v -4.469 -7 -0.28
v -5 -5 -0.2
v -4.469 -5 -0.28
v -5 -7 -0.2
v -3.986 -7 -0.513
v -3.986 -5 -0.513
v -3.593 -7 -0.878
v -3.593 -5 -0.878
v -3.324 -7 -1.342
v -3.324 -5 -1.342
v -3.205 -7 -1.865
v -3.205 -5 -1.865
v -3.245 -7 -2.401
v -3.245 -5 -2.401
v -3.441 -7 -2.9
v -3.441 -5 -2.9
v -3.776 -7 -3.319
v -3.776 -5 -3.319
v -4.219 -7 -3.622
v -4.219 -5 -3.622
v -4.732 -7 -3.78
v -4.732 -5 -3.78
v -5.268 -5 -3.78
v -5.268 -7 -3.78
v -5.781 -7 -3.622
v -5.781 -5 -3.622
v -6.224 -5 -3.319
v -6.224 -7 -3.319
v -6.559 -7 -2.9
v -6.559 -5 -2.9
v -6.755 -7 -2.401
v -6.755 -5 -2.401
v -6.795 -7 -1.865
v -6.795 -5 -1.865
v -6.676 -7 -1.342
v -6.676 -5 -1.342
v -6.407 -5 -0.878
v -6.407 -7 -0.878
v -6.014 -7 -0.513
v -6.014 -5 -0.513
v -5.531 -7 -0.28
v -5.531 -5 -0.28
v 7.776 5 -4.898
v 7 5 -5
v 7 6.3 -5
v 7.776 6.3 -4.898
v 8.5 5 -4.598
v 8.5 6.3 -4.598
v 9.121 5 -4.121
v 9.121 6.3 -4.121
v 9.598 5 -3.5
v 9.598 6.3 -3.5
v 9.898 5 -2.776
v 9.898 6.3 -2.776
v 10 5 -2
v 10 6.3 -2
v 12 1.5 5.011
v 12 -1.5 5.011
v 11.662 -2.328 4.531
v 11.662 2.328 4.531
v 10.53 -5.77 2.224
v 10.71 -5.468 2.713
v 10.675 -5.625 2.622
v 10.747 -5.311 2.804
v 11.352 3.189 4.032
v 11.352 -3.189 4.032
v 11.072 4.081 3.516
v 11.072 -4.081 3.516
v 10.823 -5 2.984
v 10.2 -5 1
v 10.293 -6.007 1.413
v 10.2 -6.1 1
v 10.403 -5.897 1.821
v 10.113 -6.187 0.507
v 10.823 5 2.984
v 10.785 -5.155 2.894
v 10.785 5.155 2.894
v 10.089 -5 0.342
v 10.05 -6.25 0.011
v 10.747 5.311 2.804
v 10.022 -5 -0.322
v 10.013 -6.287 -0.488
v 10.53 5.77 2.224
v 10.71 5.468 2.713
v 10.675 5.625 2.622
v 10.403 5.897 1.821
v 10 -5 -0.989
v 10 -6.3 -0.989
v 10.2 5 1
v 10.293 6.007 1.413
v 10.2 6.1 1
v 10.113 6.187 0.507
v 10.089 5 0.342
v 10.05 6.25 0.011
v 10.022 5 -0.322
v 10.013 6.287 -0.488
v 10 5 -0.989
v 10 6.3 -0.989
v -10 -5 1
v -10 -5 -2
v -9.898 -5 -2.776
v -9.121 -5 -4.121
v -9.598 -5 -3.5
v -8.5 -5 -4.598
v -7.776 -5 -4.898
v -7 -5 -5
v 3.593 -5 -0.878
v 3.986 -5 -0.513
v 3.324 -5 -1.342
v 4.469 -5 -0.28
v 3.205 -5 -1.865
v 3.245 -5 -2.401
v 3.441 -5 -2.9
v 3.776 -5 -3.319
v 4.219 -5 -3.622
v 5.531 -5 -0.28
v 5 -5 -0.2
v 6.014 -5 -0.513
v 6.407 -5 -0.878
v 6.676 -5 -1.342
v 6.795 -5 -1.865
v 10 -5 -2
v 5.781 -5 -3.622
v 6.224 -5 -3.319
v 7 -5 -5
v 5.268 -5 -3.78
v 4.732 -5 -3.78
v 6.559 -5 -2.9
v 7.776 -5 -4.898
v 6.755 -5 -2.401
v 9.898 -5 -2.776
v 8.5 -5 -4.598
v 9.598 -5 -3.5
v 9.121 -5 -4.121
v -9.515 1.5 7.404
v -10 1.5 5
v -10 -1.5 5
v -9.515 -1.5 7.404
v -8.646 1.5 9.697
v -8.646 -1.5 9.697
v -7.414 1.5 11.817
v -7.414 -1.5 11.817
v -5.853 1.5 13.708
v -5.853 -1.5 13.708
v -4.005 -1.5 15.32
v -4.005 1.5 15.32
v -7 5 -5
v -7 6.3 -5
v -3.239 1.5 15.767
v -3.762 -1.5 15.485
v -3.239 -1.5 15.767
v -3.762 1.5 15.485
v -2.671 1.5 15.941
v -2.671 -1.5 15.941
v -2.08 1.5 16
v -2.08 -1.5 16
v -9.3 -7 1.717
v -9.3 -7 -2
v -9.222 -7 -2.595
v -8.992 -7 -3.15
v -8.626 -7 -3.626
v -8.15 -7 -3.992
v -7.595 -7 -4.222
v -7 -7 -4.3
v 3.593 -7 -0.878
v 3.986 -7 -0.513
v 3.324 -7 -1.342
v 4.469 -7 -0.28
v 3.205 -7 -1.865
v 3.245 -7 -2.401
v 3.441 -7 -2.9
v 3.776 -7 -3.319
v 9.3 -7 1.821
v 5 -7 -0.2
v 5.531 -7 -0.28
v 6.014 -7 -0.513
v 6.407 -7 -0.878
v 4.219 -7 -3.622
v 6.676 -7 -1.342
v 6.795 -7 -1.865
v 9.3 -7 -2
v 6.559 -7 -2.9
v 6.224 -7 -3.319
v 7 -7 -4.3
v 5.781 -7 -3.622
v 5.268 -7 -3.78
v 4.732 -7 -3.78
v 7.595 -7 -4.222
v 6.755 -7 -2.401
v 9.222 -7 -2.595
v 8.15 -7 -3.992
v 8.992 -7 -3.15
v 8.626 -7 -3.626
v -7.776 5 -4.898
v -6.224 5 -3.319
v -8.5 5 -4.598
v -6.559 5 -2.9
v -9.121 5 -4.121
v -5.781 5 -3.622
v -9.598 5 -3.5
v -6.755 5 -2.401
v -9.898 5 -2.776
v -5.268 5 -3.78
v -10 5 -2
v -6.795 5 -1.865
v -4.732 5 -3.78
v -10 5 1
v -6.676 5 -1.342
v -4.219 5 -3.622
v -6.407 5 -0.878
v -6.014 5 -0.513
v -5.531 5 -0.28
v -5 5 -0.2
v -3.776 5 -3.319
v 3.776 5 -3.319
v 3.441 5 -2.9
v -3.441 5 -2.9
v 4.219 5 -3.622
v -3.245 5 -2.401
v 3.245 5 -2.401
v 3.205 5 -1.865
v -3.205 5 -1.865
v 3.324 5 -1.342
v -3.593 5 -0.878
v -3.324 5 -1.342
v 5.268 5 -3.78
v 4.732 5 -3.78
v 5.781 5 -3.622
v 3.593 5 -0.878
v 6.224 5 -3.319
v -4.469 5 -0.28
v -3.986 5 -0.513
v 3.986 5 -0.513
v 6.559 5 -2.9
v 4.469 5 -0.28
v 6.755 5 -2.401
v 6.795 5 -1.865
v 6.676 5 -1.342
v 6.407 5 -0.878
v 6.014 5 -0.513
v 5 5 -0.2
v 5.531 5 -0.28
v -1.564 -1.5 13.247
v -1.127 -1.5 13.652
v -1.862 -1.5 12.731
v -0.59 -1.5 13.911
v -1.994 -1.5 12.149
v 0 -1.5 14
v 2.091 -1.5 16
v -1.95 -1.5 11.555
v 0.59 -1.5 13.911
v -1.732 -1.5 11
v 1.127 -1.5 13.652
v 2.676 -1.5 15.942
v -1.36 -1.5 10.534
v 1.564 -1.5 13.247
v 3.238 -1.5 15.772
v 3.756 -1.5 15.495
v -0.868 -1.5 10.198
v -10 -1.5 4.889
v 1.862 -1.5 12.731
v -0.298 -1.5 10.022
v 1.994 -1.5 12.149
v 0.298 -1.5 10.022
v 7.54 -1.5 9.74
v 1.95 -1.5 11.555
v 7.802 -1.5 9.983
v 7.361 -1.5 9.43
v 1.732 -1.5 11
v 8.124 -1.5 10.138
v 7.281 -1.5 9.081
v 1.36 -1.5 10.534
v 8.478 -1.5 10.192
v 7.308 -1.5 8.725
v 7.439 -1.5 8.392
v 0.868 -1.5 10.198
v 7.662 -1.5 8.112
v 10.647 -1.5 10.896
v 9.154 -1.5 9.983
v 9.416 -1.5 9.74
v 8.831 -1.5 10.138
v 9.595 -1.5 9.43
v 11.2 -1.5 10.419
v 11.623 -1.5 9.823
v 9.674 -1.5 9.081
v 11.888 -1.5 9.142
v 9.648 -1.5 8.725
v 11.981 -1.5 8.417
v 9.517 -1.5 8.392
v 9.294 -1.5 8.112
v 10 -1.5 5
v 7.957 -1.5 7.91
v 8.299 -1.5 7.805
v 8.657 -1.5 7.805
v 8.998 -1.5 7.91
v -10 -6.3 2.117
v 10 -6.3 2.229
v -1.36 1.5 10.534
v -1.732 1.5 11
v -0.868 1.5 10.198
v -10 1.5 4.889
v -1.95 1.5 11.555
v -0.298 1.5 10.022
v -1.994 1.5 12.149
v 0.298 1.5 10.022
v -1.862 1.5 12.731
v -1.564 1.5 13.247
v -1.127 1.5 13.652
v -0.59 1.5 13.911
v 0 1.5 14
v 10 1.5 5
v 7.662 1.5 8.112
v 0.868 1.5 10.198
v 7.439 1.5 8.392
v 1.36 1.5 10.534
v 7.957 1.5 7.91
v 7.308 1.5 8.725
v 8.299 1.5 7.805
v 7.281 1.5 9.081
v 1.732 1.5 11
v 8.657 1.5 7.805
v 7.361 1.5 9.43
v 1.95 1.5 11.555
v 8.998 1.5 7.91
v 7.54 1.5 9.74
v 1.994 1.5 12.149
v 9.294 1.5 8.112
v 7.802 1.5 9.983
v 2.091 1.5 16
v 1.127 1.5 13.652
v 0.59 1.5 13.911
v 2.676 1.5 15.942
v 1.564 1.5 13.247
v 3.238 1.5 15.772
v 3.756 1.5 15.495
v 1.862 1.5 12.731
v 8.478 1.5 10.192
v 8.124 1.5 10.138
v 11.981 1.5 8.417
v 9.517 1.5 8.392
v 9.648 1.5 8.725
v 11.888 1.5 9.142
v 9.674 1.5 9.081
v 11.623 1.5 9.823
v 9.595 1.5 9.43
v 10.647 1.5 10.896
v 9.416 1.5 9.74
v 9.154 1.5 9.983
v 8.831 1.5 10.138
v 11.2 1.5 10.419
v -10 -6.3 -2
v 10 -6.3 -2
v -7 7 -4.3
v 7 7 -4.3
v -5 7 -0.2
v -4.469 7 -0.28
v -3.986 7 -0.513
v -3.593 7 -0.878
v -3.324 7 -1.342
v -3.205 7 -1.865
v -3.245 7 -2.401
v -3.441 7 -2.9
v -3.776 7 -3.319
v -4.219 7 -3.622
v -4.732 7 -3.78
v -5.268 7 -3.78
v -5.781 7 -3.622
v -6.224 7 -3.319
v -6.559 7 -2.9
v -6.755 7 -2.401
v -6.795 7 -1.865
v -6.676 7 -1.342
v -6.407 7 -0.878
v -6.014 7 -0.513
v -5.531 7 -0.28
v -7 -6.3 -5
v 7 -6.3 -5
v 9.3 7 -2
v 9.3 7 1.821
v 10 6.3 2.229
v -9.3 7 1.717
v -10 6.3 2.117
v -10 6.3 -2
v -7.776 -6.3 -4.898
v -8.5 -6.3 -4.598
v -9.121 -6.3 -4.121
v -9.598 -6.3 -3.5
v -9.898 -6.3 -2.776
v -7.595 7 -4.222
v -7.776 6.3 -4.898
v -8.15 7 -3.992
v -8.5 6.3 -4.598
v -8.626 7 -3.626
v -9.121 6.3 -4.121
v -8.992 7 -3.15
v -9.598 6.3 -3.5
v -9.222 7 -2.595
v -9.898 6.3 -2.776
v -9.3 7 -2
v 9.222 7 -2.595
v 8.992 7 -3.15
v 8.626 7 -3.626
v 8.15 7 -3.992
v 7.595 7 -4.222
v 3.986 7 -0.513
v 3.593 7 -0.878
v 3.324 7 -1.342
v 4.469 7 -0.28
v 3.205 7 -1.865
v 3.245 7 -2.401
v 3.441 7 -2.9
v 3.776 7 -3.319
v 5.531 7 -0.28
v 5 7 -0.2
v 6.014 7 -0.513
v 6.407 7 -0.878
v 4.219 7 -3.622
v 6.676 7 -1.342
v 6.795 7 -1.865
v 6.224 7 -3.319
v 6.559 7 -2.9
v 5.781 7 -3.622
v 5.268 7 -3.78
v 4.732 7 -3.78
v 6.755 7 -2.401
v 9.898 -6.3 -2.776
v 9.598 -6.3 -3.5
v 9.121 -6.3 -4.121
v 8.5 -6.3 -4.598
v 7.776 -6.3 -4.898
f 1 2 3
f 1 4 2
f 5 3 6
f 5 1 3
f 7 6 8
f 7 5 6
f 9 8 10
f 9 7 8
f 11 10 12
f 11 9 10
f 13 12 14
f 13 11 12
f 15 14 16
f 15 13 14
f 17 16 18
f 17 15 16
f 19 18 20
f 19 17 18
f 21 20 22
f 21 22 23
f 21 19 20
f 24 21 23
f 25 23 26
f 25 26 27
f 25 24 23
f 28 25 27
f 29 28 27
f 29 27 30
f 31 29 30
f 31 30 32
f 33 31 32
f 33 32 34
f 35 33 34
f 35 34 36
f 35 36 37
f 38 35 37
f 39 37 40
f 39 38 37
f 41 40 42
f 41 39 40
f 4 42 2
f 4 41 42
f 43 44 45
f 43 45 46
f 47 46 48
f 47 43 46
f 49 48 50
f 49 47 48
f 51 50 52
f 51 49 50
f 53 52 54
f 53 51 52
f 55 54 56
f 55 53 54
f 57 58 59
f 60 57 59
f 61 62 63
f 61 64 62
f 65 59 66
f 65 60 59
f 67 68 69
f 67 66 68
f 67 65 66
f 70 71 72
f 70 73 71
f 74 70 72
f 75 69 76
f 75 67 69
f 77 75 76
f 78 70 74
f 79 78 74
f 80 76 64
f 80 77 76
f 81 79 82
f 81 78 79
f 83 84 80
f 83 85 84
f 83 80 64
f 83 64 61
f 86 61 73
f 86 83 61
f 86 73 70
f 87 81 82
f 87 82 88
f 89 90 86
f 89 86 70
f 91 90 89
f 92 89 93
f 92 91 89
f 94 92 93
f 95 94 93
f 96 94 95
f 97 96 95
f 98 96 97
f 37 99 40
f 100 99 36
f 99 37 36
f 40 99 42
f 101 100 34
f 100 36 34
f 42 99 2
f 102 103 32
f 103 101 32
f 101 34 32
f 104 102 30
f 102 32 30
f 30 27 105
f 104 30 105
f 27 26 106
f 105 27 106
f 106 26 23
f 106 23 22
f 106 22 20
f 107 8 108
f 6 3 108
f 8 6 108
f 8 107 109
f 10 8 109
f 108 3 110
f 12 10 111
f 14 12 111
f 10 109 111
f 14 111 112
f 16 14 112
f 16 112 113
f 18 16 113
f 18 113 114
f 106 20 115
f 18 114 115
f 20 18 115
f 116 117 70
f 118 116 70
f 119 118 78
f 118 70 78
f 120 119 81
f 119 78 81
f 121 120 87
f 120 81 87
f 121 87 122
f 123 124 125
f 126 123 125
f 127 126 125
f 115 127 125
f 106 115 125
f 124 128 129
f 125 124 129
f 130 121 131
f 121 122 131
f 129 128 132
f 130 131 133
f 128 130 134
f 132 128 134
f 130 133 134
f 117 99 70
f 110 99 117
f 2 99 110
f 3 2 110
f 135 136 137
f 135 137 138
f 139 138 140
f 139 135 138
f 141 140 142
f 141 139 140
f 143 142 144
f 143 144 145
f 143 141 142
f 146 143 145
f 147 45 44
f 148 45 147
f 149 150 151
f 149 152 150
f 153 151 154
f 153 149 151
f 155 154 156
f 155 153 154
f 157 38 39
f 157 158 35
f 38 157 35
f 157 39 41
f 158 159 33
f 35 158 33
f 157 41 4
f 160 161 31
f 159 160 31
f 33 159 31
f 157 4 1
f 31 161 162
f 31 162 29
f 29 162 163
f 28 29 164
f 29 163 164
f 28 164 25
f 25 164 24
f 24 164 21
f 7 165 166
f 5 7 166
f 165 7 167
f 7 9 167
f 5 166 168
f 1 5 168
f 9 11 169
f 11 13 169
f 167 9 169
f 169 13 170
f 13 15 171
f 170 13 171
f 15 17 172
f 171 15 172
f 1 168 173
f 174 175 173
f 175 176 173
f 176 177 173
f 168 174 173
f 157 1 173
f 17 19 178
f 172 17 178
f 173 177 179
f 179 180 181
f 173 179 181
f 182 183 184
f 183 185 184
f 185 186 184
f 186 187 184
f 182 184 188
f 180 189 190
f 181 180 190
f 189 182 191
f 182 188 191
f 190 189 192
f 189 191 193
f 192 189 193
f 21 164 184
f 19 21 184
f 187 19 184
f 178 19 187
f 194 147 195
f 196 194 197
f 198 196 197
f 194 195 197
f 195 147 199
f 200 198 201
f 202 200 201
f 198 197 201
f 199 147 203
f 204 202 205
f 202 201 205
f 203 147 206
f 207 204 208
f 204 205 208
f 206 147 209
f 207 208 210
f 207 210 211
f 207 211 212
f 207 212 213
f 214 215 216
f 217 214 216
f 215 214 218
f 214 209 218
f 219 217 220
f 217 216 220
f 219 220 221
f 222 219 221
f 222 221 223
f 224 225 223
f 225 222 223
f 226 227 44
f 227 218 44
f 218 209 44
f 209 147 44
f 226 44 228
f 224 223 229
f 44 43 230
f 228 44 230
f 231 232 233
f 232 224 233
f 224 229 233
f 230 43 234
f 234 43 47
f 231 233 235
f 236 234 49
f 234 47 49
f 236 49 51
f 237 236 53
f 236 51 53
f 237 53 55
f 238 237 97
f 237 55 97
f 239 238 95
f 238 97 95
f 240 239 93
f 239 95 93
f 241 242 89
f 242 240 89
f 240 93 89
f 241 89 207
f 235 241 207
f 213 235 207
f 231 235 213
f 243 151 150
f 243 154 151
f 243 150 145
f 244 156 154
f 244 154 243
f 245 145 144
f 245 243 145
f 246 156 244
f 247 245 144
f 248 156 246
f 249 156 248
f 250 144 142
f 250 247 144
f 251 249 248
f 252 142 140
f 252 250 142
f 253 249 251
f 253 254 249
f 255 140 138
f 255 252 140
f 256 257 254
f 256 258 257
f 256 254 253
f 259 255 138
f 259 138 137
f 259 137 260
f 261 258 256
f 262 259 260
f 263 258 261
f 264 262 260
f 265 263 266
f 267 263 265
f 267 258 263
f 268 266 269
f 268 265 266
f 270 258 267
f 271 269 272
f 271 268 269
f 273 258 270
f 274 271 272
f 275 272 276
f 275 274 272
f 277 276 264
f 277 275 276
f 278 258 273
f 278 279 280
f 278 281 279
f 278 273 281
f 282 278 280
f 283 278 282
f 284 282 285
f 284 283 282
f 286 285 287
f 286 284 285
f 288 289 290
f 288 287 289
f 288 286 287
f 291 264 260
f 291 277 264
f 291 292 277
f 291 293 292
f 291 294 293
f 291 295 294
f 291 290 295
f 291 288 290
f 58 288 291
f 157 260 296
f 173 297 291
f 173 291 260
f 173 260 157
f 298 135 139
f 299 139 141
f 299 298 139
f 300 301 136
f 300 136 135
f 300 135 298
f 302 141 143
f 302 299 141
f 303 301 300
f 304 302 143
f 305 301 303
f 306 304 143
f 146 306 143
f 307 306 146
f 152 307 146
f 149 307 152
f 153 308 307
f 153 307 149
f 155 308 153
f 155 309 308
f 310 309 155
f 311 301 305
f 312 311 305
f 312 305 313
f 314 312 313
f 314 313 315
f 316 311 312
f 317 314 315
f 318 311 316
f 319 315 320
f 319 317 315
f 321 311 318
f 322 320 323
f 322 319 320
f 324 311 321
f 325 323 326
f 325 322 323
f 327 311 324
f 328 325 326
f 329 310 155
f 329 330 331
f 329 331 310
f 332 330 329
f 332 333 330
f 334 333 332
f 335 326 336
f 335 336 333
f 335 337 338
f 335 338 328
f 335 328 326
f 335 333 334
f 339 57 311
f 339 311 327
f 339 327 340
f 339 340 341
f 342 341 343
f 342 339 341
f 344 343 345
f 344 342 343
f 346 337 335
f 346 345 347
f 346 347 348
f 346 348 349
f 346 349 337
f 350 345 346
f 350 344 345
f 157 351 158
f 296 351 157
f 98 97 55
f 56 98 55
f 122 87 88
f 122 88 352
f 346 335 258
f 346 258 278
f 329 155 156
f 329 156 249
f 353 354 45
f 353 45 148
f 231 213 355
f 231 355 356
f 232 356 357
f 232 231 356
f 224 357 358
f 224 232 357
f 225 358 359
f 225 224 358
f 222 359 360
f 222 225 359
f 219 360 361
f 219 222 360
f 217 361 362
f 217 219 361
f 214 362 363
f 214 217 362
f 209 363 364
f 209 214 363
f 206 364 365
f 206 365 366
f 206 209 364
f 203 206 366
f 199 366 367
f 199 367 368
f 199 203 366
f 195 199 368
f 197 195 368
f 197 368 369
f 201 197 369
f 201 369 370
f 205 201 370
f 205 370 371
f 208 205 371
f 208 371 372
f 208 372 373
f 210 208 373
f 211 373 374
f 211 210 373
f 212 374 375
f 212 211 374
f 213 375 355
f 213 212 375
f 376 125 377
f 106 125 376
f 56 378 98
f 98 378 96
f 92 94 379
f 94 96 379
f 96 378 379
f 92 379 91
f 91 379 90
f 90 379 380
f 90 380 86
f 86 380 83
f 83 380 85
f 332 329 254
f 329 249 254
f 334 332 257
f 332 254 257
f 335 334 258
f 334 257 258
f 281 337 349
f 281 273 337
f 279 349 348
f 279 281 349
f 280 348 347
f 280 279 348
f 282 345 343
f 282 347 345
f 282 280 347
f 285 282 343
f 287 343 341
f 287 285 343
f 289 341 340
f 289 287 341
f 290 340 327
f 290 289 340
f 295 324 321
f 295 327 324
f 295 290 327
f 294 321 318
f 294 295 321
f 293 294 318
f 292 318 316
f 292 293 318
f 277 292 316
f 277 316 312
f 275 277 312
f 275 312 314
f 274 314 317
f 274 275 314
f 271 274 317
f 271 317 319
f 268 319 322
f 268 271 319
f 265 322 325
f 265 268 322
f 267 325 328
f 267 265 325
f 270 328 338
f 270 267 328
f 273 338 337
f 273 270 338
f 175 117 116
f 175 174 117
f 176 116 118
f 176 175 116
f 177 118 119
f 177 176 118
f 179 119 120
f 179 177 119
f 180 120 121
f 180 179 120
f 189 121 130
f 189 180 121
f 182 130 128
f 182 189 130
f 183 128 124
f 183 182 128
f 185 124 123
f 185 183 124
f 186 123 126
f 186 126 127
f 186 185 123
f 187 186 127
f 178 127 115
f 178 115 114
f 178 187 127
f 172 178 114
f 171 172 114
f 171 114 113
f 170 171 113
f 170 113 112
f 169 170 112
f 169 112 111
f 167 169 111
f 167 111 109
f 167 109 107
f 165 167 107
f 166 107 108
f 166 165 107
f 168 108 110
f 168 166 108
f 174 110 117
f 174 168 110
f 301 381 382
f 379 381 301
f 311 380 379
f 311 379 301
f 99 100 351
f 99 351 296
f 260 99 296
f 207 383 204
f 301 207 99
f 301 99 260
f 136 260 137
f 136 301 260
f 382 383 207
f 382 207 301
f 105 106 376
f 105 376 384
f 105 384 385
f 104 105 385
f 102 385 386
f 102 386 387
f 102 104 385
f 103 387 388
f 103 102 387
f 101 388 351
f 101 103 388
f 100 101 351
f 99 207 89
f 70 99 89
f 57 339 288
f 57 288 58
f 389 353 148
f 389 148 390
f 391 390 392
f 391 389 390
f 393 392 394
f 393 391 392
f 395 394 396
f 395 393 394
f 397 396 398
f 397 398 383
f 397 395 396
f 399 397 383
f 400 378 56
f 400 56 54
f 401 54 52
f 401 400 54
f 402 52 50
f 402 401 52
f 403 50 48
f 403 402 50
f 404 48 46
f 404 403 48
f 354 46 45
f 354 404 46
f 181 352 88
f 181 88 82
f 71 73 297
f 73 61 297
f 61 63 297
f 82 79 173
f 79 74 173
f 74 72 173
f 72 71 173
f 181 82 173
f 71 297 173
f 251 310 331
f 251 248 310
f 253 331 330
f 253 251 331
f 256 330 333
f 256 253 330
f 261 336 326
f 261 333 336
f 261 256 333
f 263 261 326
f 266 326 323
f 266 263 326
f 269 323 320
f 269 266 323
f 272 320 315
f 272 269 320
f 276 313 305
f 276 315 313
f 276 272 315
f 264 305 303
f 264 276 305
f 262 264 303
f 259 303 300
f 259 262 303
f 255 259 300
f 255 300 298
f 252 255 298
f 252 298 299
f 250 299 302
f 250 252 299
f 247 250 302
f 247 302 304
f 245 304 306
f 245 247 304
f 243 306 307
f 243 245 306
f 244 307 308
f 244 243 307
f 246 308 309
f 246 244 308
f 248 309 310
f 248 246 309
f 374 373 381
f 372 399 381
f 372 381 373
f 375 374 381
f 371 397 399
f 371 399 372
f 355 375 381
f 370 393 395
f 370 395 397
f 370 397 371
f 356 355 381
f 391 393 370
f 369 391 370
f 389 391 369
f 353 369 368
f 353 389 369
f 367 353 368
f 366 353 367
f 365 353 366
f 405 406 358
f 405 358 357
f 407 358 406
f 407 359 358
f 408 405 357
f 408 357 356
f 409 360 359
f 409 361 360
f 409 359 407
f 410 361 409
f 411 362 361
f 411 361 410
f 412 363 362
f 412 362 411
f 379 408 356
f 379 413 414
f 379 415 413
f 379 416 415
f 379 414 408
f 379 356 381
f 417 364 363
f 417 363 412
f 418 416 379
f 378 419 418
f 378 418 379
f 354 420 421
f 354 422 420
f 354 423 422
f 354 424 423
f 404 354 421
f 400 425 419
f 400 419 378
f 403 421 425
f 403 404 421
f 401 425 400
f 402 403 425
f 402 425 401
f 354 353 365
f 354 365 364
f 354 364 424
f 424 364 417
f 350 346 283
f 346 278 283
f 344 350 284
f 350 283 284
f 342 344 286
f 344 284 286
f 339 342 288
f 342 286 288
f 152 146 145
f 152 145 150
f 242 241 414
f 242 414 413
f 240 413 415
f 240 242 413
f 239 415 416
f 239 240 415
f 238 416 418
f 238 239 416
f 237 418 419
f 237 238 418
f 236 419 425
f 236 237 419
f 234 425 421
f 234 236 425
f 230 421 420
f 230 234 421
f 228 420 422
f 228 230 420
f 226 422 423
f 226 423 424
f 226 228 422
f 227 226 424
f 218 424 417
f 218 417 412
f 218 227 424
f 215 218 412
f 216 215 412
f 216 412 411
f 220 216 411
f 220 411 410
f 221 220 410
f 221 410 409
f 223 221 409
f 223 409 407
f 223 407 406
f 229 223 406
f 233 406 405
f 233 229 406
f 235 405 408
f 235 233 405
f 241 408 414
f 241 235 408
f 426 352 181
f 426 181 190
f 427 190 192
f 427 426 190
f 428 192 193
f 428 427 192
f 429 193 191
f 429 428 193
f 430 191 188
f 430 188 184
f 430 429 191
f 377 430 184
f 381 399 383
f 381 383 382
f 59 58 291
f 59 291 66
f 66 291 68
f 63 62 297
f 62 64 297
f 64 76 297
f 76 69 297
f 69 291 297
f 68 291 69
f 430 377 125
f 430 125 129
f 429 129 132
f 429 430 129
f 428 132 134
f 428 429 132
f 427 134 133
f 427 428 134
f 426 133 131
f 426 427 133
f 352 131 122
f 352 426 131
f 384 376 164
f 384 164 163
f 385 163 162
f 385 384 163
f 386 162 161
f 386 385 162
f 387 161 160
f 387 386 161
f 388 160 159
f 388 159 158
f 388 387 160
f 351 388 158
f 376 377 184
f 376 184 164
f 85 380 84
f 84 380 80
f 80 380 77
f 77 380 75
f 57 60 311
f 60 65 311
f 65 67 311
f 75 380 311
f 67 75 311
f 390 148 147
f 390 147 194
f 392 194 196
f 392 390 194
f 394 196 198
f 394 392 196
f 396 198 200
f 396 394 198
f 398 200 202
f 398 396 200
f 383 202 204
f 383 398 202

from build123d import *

# Parameters (mm, degrees)
SKETCH1_R           = 1.8
SKETCH1_R_2         = 1.2
SKETCH1_R_3         = 2
BOSS_EXTRUDE1_DEPTH = 7
SKETCH1_3_W         = 20
SKETCH1_3_H         = 6
SKETCH1_3_R         = 1.8
CUT_EXTRUDE1_DEPTH  = 5
FILLET1_R           = 3
CHAMFER3_SIZE       = 0.7
CUT_EXTRUDE2_DEPTH  = 29.072613197
FILLET2_R           = 10
FILLET3_R           = 3


with BuildPart() as part:
    # Sketch1 → Boss-Extrude1 (new, symmetric)
    with BuildSketch(Plane(origin=(0, 0, 0), x_dir=(1, 0, 0), z_dir=(0, 1, 0))):
        with BuildLine():
            Line((10, 5), (-10, 5))
            Line((-10, 5), (-10, -5))
            ThreePointArc((-10, -5), (-8.073014031, -10.781966564), (-4.004817267, -15.320048466))
            Line((-4.004817267, -15.320048466), (-3, -16))
            Line((-3, -16), (3, -16))
            Line((3, -16), (11.972113592, -10.011064555))
            Line((11.972113592, -10.011064555), (11.999968963, -5.011142148))
            Line((11.999968963, -5.011142148), (10, -5))
            Line((10, -5), (10, 5))
        make_face()
        with Locations(Location((-5, 2, 0), (0, 0, 270))):
            Circle(SKETCH1_R, mode=Mode.SUBTRACT)
        with Locations(Location((5, 2, 0), (0, 0, 270))):
            Circle(SKETCH1_R, mode=Mode.SUBTRACT)
        with Locations(Location((8.477738981, -8.991581315, 0), (0, 0, 270))):
            Circle(SKETCH1_R_2, mode=Mode.SUBTRACT)
        with Locations(Location((0, -12, 0), (0, 0, 270))):
            Circle(SKETCH1_R_3, mode=Mode.SUBTRACT)
    extrude(amount=BOSS_EXTRUDE1_DEPTH, both=True)

    # Sketch1<3> → Cut-Extrude1 (cut, symmetric)
    # profile 1 of 2: a face of its own
    with BuildSketch(Plane(origin=(0, 0, 0), x_dir=(1, 0, 0), z_dir=(0, 1, 0))):
        with Locations((0, 2)):
            Rectangle(SKETCH1_3_W, SKETCH1_3_H)
        with Locations(Location((-5, 2, 0), (0, 0, 270))):
            Circle(SKETCH1_3_R, mode=Mode.SUBTRACT)
        with Locations(Location((5, 2, 0), (0, 0, 270))):
            Circle(SKETCH1_3_R, mode=Mode.SUBTRACT)
    # profile 2 of 2: a face of its own
    with BuildSketch(Plane(origin=(0, 0, 0), x_dir=(1, 0, 0), z_dir=(0, 1, 0))):
        with BuildLine():
            Line((-3, -16), (-4.004817267, -15.320048466))
            ThreePointArc((-4.004817267, -15.320048466), (-3.509286078, -15.670187568), (-3, -16))
        make_face()
    extrude(amount=CUT_EXTRUDE1_DEPTH, both=True, mode=Mode.SUBTRACT)

    # Fillet1
    fillet1_edges = [part.edges().sort_by_distance(p)[0] for p in [
        (-10, 6, -5),
        (10, 6, -5),
        (-10, -6, -5),
        (10, -6, -5),
    ]]
    fillet(fillet1_edges, radius=FILLET1_R)

    # Chamfer3
    chamfer3_edges = [part.edges().sort_by_distance(p)[0] for p in [
        (10, -7, 1.5),
        (-10, 7, 1.5),
        (-10, -7, 1.5),
        (10, 7, 1.5),
        (0, -7, -5),
        (9.121320344, -7, -4.121320344),
        (-9.121320344, -7, -4.121320344),
        (0, 7, -5),
        (9.121320344, 7, -4.121320344),
        (-9.121320344, 7, -4.121320344),
    ]]
    chamfer(chamfer3_edges, length=CHAMFER3_SIZE)

    # Sketch2 → Cut-Extrude2 (cut, through all)
    with BuildSketch(Plane(origin=(12.027513532, 0, 0.067007209), x_dir=(0.005571074109334343, 0, -0.9999844814462214), z_dir=(0.9999844814462214, 0, 0.005571074109334343))):
        Polygon((-20.022955032, 1.5), (-20.022955032, 7), (-1.768785186, 7), (-4.944211666, 1.5), align=None)
        Polygon((-20.050357448, -7), (-20.050357448, -1.5), (-4.944211666, -1.5), (-1.768785186, -7), align=None)
    extrude(amount=-CUT_EXTRUDE2_DEPTH, mode=Mode.SUBTRACT)

    # Fillet2
    # the kernel refuses this fillet: 10 mm, written as the material it adds along each edge
    with BuildSketch(Plane(origin=(10, 16.472041172, 5), x_dir=(0, 0, -1), z_dir=(0, -1, 0))) as fillet2_piece_1_section:
        with BuildLine():
            CenterArc((5.988816469, 10), FILLET2_R, 233.130398738, 36.869601262)
            Line((-0.011142148, 1.999968963), (0, 0))
            Line((0, 0), (5.988816469, 0))
        make_face()
    fillet2_piece_1 = extrude(amount=32.944082344, mode=Mode.PRIVATE)
    fillet2_piece_1 = split(fillet2_piece_1, bisect_by=Plane(origin=(10, 5, 5), z_dir=(0, 1, 0)), keep=Keep.TOP, mode=Mode.PRIVATE)
    fillet2_piece_1 = split(fillet2_piece_1, bisect_by=Plane(origin=(10.036117741, 12.729030879, -1.482983393), z_dir=(0.004824691705049313, -0.4999999999999978, -0.8660119643226377)), keep=Keep.TOP, mode=Mode.PRIVATE)
    fillet2_piece_1 = split(fillet2_piece_1, bisect_by=Plane(origin=(4.913979414, 11.386020586, 5), z_dir=(-0.707106781186548, -0.7071067811865471, 0)), keep=Keep.TOP, mode=Mode.PRIVATE)
    add(fillet2_piece_1)
    with BuildSketch(Plane(origin=(10, 16.472041172, 5), x_dir=(0, 0, -1), z_dir=(0, -1, 0))) as fillet2_piece_2_section:
        with BuildLine():
            CenterArc((5.988816469, 10), FILLET2_R, 233.130398738, 36.869601262)
            Line((-0.011142148, 1.999968963), (0, 0))
            Line((0, 0), (5.988816469, 0))
        make_face()
    fillet2_piece_2 = extrude(amount=32.944082344, mode=Mode.PRIVATE)
    fillet2_piece_2 = split(fillet2_piece_2, bisect_by=Plane(origin=(10, 16.472041172, 1), z_dir=(0, 0, 1)), keep=Keep.TOP, mode=Mode.PRIVATE)
    fillet2_piece_2 = split(fillet2_piece_2, bisect_by=Plane(origin=(21.386020586, 5.086020586, 5), z_dir=(-0.707106781186548, 0.7071067811865471, 0)), keep=Keep.TOP, mode=Mode.PRIVATE)
    fillet2_piece_2 = split(fillet2_piece_2, bisect_by=Plane(origin=(9.956645221, 11.979030879, 12.782001339), z_dir=(0.004824691705049311, 0.4999999999999981, -0.8660119643226375)), keep=Keep.TOP, mode=Mode.PRIVATE)
    fillet2_piece_2 = split(fillet2_piece_2, bisect_by=Plane(origin=(10.036117741, 12.729030879, -1.482983393), z_dir=(0.004824691705049313, -0.4999999999999978, -0.8660119643226377)), keep=Keep.TOP, mode=Mode.PRIVATE)
    fillet2_piece_2 = split(fillet2_piece_2, bisect_by=Plane(origin=(4.913979414, 11.386020586, 5), z_dir=(-0.707106781186548, -0.7071067811865471, 0)), keep=Keep.TOP, mode=Mode.PRIVATE)
    add(fillet2_piece_2)
    with BuildSketch(Plane(origin=(10, 16.472041172, 5), x_dir=(0, 0, -1), z_dir=(0, -1, 0))) as fillet2_piece_3_section:
        with BuildLine():
            CenterArc((5.988816469, 10), FILLET2_R, 233.130398738, 36.869601262)
            Line((-0.011142148, 1.999968963), (0, 0))
            Line((0, 0), (5.988816469, 0))
        make_face()
    fillet2_piece_3 = extrude(amount=32.944082344, mode=Mode.PRIVATE)
    fillet2_piece_3 = split(fillet2_piece_3, bisect_by=Plane(origin=(10, -5, 5), z_dir=(0, -1, 0)), keep=Keep.TOP, mode=Mode.PRIVATE)
    fillet2_piece_3 = split(fillet2_piece_3, bisect_by=Plane(origin=(21.386020586, 5.086020586, 5), z_dir=(-0.707106781186548, 0.7071067811865471, 0)), keep=Keep.TOP, mode=Mode.PRIVATE)
    fillet2_piece_3 = split(fillet2_piece_3, bisect_by=Plane(origin=(9.956645221, 11.979030879, 12.782001339), z_dir=(0.004824691705049311, 0.4999999999999981, -0.8660119643226375)), keep=Keep.TOP, mode=Mode.PRIVATE)
    add(fillet2_piece_3)

    # Fillet3
    fillet3_edges = [part.edges().sort_by_distance(p)[0] for p in [
        (11.972113592, 0, 10.011064555),
        (3, 0, 16),
        (-3, 0, 16),
    ]]
    fillet(fillet3_edges, radius=FILLET3_R)


solid = part.part
